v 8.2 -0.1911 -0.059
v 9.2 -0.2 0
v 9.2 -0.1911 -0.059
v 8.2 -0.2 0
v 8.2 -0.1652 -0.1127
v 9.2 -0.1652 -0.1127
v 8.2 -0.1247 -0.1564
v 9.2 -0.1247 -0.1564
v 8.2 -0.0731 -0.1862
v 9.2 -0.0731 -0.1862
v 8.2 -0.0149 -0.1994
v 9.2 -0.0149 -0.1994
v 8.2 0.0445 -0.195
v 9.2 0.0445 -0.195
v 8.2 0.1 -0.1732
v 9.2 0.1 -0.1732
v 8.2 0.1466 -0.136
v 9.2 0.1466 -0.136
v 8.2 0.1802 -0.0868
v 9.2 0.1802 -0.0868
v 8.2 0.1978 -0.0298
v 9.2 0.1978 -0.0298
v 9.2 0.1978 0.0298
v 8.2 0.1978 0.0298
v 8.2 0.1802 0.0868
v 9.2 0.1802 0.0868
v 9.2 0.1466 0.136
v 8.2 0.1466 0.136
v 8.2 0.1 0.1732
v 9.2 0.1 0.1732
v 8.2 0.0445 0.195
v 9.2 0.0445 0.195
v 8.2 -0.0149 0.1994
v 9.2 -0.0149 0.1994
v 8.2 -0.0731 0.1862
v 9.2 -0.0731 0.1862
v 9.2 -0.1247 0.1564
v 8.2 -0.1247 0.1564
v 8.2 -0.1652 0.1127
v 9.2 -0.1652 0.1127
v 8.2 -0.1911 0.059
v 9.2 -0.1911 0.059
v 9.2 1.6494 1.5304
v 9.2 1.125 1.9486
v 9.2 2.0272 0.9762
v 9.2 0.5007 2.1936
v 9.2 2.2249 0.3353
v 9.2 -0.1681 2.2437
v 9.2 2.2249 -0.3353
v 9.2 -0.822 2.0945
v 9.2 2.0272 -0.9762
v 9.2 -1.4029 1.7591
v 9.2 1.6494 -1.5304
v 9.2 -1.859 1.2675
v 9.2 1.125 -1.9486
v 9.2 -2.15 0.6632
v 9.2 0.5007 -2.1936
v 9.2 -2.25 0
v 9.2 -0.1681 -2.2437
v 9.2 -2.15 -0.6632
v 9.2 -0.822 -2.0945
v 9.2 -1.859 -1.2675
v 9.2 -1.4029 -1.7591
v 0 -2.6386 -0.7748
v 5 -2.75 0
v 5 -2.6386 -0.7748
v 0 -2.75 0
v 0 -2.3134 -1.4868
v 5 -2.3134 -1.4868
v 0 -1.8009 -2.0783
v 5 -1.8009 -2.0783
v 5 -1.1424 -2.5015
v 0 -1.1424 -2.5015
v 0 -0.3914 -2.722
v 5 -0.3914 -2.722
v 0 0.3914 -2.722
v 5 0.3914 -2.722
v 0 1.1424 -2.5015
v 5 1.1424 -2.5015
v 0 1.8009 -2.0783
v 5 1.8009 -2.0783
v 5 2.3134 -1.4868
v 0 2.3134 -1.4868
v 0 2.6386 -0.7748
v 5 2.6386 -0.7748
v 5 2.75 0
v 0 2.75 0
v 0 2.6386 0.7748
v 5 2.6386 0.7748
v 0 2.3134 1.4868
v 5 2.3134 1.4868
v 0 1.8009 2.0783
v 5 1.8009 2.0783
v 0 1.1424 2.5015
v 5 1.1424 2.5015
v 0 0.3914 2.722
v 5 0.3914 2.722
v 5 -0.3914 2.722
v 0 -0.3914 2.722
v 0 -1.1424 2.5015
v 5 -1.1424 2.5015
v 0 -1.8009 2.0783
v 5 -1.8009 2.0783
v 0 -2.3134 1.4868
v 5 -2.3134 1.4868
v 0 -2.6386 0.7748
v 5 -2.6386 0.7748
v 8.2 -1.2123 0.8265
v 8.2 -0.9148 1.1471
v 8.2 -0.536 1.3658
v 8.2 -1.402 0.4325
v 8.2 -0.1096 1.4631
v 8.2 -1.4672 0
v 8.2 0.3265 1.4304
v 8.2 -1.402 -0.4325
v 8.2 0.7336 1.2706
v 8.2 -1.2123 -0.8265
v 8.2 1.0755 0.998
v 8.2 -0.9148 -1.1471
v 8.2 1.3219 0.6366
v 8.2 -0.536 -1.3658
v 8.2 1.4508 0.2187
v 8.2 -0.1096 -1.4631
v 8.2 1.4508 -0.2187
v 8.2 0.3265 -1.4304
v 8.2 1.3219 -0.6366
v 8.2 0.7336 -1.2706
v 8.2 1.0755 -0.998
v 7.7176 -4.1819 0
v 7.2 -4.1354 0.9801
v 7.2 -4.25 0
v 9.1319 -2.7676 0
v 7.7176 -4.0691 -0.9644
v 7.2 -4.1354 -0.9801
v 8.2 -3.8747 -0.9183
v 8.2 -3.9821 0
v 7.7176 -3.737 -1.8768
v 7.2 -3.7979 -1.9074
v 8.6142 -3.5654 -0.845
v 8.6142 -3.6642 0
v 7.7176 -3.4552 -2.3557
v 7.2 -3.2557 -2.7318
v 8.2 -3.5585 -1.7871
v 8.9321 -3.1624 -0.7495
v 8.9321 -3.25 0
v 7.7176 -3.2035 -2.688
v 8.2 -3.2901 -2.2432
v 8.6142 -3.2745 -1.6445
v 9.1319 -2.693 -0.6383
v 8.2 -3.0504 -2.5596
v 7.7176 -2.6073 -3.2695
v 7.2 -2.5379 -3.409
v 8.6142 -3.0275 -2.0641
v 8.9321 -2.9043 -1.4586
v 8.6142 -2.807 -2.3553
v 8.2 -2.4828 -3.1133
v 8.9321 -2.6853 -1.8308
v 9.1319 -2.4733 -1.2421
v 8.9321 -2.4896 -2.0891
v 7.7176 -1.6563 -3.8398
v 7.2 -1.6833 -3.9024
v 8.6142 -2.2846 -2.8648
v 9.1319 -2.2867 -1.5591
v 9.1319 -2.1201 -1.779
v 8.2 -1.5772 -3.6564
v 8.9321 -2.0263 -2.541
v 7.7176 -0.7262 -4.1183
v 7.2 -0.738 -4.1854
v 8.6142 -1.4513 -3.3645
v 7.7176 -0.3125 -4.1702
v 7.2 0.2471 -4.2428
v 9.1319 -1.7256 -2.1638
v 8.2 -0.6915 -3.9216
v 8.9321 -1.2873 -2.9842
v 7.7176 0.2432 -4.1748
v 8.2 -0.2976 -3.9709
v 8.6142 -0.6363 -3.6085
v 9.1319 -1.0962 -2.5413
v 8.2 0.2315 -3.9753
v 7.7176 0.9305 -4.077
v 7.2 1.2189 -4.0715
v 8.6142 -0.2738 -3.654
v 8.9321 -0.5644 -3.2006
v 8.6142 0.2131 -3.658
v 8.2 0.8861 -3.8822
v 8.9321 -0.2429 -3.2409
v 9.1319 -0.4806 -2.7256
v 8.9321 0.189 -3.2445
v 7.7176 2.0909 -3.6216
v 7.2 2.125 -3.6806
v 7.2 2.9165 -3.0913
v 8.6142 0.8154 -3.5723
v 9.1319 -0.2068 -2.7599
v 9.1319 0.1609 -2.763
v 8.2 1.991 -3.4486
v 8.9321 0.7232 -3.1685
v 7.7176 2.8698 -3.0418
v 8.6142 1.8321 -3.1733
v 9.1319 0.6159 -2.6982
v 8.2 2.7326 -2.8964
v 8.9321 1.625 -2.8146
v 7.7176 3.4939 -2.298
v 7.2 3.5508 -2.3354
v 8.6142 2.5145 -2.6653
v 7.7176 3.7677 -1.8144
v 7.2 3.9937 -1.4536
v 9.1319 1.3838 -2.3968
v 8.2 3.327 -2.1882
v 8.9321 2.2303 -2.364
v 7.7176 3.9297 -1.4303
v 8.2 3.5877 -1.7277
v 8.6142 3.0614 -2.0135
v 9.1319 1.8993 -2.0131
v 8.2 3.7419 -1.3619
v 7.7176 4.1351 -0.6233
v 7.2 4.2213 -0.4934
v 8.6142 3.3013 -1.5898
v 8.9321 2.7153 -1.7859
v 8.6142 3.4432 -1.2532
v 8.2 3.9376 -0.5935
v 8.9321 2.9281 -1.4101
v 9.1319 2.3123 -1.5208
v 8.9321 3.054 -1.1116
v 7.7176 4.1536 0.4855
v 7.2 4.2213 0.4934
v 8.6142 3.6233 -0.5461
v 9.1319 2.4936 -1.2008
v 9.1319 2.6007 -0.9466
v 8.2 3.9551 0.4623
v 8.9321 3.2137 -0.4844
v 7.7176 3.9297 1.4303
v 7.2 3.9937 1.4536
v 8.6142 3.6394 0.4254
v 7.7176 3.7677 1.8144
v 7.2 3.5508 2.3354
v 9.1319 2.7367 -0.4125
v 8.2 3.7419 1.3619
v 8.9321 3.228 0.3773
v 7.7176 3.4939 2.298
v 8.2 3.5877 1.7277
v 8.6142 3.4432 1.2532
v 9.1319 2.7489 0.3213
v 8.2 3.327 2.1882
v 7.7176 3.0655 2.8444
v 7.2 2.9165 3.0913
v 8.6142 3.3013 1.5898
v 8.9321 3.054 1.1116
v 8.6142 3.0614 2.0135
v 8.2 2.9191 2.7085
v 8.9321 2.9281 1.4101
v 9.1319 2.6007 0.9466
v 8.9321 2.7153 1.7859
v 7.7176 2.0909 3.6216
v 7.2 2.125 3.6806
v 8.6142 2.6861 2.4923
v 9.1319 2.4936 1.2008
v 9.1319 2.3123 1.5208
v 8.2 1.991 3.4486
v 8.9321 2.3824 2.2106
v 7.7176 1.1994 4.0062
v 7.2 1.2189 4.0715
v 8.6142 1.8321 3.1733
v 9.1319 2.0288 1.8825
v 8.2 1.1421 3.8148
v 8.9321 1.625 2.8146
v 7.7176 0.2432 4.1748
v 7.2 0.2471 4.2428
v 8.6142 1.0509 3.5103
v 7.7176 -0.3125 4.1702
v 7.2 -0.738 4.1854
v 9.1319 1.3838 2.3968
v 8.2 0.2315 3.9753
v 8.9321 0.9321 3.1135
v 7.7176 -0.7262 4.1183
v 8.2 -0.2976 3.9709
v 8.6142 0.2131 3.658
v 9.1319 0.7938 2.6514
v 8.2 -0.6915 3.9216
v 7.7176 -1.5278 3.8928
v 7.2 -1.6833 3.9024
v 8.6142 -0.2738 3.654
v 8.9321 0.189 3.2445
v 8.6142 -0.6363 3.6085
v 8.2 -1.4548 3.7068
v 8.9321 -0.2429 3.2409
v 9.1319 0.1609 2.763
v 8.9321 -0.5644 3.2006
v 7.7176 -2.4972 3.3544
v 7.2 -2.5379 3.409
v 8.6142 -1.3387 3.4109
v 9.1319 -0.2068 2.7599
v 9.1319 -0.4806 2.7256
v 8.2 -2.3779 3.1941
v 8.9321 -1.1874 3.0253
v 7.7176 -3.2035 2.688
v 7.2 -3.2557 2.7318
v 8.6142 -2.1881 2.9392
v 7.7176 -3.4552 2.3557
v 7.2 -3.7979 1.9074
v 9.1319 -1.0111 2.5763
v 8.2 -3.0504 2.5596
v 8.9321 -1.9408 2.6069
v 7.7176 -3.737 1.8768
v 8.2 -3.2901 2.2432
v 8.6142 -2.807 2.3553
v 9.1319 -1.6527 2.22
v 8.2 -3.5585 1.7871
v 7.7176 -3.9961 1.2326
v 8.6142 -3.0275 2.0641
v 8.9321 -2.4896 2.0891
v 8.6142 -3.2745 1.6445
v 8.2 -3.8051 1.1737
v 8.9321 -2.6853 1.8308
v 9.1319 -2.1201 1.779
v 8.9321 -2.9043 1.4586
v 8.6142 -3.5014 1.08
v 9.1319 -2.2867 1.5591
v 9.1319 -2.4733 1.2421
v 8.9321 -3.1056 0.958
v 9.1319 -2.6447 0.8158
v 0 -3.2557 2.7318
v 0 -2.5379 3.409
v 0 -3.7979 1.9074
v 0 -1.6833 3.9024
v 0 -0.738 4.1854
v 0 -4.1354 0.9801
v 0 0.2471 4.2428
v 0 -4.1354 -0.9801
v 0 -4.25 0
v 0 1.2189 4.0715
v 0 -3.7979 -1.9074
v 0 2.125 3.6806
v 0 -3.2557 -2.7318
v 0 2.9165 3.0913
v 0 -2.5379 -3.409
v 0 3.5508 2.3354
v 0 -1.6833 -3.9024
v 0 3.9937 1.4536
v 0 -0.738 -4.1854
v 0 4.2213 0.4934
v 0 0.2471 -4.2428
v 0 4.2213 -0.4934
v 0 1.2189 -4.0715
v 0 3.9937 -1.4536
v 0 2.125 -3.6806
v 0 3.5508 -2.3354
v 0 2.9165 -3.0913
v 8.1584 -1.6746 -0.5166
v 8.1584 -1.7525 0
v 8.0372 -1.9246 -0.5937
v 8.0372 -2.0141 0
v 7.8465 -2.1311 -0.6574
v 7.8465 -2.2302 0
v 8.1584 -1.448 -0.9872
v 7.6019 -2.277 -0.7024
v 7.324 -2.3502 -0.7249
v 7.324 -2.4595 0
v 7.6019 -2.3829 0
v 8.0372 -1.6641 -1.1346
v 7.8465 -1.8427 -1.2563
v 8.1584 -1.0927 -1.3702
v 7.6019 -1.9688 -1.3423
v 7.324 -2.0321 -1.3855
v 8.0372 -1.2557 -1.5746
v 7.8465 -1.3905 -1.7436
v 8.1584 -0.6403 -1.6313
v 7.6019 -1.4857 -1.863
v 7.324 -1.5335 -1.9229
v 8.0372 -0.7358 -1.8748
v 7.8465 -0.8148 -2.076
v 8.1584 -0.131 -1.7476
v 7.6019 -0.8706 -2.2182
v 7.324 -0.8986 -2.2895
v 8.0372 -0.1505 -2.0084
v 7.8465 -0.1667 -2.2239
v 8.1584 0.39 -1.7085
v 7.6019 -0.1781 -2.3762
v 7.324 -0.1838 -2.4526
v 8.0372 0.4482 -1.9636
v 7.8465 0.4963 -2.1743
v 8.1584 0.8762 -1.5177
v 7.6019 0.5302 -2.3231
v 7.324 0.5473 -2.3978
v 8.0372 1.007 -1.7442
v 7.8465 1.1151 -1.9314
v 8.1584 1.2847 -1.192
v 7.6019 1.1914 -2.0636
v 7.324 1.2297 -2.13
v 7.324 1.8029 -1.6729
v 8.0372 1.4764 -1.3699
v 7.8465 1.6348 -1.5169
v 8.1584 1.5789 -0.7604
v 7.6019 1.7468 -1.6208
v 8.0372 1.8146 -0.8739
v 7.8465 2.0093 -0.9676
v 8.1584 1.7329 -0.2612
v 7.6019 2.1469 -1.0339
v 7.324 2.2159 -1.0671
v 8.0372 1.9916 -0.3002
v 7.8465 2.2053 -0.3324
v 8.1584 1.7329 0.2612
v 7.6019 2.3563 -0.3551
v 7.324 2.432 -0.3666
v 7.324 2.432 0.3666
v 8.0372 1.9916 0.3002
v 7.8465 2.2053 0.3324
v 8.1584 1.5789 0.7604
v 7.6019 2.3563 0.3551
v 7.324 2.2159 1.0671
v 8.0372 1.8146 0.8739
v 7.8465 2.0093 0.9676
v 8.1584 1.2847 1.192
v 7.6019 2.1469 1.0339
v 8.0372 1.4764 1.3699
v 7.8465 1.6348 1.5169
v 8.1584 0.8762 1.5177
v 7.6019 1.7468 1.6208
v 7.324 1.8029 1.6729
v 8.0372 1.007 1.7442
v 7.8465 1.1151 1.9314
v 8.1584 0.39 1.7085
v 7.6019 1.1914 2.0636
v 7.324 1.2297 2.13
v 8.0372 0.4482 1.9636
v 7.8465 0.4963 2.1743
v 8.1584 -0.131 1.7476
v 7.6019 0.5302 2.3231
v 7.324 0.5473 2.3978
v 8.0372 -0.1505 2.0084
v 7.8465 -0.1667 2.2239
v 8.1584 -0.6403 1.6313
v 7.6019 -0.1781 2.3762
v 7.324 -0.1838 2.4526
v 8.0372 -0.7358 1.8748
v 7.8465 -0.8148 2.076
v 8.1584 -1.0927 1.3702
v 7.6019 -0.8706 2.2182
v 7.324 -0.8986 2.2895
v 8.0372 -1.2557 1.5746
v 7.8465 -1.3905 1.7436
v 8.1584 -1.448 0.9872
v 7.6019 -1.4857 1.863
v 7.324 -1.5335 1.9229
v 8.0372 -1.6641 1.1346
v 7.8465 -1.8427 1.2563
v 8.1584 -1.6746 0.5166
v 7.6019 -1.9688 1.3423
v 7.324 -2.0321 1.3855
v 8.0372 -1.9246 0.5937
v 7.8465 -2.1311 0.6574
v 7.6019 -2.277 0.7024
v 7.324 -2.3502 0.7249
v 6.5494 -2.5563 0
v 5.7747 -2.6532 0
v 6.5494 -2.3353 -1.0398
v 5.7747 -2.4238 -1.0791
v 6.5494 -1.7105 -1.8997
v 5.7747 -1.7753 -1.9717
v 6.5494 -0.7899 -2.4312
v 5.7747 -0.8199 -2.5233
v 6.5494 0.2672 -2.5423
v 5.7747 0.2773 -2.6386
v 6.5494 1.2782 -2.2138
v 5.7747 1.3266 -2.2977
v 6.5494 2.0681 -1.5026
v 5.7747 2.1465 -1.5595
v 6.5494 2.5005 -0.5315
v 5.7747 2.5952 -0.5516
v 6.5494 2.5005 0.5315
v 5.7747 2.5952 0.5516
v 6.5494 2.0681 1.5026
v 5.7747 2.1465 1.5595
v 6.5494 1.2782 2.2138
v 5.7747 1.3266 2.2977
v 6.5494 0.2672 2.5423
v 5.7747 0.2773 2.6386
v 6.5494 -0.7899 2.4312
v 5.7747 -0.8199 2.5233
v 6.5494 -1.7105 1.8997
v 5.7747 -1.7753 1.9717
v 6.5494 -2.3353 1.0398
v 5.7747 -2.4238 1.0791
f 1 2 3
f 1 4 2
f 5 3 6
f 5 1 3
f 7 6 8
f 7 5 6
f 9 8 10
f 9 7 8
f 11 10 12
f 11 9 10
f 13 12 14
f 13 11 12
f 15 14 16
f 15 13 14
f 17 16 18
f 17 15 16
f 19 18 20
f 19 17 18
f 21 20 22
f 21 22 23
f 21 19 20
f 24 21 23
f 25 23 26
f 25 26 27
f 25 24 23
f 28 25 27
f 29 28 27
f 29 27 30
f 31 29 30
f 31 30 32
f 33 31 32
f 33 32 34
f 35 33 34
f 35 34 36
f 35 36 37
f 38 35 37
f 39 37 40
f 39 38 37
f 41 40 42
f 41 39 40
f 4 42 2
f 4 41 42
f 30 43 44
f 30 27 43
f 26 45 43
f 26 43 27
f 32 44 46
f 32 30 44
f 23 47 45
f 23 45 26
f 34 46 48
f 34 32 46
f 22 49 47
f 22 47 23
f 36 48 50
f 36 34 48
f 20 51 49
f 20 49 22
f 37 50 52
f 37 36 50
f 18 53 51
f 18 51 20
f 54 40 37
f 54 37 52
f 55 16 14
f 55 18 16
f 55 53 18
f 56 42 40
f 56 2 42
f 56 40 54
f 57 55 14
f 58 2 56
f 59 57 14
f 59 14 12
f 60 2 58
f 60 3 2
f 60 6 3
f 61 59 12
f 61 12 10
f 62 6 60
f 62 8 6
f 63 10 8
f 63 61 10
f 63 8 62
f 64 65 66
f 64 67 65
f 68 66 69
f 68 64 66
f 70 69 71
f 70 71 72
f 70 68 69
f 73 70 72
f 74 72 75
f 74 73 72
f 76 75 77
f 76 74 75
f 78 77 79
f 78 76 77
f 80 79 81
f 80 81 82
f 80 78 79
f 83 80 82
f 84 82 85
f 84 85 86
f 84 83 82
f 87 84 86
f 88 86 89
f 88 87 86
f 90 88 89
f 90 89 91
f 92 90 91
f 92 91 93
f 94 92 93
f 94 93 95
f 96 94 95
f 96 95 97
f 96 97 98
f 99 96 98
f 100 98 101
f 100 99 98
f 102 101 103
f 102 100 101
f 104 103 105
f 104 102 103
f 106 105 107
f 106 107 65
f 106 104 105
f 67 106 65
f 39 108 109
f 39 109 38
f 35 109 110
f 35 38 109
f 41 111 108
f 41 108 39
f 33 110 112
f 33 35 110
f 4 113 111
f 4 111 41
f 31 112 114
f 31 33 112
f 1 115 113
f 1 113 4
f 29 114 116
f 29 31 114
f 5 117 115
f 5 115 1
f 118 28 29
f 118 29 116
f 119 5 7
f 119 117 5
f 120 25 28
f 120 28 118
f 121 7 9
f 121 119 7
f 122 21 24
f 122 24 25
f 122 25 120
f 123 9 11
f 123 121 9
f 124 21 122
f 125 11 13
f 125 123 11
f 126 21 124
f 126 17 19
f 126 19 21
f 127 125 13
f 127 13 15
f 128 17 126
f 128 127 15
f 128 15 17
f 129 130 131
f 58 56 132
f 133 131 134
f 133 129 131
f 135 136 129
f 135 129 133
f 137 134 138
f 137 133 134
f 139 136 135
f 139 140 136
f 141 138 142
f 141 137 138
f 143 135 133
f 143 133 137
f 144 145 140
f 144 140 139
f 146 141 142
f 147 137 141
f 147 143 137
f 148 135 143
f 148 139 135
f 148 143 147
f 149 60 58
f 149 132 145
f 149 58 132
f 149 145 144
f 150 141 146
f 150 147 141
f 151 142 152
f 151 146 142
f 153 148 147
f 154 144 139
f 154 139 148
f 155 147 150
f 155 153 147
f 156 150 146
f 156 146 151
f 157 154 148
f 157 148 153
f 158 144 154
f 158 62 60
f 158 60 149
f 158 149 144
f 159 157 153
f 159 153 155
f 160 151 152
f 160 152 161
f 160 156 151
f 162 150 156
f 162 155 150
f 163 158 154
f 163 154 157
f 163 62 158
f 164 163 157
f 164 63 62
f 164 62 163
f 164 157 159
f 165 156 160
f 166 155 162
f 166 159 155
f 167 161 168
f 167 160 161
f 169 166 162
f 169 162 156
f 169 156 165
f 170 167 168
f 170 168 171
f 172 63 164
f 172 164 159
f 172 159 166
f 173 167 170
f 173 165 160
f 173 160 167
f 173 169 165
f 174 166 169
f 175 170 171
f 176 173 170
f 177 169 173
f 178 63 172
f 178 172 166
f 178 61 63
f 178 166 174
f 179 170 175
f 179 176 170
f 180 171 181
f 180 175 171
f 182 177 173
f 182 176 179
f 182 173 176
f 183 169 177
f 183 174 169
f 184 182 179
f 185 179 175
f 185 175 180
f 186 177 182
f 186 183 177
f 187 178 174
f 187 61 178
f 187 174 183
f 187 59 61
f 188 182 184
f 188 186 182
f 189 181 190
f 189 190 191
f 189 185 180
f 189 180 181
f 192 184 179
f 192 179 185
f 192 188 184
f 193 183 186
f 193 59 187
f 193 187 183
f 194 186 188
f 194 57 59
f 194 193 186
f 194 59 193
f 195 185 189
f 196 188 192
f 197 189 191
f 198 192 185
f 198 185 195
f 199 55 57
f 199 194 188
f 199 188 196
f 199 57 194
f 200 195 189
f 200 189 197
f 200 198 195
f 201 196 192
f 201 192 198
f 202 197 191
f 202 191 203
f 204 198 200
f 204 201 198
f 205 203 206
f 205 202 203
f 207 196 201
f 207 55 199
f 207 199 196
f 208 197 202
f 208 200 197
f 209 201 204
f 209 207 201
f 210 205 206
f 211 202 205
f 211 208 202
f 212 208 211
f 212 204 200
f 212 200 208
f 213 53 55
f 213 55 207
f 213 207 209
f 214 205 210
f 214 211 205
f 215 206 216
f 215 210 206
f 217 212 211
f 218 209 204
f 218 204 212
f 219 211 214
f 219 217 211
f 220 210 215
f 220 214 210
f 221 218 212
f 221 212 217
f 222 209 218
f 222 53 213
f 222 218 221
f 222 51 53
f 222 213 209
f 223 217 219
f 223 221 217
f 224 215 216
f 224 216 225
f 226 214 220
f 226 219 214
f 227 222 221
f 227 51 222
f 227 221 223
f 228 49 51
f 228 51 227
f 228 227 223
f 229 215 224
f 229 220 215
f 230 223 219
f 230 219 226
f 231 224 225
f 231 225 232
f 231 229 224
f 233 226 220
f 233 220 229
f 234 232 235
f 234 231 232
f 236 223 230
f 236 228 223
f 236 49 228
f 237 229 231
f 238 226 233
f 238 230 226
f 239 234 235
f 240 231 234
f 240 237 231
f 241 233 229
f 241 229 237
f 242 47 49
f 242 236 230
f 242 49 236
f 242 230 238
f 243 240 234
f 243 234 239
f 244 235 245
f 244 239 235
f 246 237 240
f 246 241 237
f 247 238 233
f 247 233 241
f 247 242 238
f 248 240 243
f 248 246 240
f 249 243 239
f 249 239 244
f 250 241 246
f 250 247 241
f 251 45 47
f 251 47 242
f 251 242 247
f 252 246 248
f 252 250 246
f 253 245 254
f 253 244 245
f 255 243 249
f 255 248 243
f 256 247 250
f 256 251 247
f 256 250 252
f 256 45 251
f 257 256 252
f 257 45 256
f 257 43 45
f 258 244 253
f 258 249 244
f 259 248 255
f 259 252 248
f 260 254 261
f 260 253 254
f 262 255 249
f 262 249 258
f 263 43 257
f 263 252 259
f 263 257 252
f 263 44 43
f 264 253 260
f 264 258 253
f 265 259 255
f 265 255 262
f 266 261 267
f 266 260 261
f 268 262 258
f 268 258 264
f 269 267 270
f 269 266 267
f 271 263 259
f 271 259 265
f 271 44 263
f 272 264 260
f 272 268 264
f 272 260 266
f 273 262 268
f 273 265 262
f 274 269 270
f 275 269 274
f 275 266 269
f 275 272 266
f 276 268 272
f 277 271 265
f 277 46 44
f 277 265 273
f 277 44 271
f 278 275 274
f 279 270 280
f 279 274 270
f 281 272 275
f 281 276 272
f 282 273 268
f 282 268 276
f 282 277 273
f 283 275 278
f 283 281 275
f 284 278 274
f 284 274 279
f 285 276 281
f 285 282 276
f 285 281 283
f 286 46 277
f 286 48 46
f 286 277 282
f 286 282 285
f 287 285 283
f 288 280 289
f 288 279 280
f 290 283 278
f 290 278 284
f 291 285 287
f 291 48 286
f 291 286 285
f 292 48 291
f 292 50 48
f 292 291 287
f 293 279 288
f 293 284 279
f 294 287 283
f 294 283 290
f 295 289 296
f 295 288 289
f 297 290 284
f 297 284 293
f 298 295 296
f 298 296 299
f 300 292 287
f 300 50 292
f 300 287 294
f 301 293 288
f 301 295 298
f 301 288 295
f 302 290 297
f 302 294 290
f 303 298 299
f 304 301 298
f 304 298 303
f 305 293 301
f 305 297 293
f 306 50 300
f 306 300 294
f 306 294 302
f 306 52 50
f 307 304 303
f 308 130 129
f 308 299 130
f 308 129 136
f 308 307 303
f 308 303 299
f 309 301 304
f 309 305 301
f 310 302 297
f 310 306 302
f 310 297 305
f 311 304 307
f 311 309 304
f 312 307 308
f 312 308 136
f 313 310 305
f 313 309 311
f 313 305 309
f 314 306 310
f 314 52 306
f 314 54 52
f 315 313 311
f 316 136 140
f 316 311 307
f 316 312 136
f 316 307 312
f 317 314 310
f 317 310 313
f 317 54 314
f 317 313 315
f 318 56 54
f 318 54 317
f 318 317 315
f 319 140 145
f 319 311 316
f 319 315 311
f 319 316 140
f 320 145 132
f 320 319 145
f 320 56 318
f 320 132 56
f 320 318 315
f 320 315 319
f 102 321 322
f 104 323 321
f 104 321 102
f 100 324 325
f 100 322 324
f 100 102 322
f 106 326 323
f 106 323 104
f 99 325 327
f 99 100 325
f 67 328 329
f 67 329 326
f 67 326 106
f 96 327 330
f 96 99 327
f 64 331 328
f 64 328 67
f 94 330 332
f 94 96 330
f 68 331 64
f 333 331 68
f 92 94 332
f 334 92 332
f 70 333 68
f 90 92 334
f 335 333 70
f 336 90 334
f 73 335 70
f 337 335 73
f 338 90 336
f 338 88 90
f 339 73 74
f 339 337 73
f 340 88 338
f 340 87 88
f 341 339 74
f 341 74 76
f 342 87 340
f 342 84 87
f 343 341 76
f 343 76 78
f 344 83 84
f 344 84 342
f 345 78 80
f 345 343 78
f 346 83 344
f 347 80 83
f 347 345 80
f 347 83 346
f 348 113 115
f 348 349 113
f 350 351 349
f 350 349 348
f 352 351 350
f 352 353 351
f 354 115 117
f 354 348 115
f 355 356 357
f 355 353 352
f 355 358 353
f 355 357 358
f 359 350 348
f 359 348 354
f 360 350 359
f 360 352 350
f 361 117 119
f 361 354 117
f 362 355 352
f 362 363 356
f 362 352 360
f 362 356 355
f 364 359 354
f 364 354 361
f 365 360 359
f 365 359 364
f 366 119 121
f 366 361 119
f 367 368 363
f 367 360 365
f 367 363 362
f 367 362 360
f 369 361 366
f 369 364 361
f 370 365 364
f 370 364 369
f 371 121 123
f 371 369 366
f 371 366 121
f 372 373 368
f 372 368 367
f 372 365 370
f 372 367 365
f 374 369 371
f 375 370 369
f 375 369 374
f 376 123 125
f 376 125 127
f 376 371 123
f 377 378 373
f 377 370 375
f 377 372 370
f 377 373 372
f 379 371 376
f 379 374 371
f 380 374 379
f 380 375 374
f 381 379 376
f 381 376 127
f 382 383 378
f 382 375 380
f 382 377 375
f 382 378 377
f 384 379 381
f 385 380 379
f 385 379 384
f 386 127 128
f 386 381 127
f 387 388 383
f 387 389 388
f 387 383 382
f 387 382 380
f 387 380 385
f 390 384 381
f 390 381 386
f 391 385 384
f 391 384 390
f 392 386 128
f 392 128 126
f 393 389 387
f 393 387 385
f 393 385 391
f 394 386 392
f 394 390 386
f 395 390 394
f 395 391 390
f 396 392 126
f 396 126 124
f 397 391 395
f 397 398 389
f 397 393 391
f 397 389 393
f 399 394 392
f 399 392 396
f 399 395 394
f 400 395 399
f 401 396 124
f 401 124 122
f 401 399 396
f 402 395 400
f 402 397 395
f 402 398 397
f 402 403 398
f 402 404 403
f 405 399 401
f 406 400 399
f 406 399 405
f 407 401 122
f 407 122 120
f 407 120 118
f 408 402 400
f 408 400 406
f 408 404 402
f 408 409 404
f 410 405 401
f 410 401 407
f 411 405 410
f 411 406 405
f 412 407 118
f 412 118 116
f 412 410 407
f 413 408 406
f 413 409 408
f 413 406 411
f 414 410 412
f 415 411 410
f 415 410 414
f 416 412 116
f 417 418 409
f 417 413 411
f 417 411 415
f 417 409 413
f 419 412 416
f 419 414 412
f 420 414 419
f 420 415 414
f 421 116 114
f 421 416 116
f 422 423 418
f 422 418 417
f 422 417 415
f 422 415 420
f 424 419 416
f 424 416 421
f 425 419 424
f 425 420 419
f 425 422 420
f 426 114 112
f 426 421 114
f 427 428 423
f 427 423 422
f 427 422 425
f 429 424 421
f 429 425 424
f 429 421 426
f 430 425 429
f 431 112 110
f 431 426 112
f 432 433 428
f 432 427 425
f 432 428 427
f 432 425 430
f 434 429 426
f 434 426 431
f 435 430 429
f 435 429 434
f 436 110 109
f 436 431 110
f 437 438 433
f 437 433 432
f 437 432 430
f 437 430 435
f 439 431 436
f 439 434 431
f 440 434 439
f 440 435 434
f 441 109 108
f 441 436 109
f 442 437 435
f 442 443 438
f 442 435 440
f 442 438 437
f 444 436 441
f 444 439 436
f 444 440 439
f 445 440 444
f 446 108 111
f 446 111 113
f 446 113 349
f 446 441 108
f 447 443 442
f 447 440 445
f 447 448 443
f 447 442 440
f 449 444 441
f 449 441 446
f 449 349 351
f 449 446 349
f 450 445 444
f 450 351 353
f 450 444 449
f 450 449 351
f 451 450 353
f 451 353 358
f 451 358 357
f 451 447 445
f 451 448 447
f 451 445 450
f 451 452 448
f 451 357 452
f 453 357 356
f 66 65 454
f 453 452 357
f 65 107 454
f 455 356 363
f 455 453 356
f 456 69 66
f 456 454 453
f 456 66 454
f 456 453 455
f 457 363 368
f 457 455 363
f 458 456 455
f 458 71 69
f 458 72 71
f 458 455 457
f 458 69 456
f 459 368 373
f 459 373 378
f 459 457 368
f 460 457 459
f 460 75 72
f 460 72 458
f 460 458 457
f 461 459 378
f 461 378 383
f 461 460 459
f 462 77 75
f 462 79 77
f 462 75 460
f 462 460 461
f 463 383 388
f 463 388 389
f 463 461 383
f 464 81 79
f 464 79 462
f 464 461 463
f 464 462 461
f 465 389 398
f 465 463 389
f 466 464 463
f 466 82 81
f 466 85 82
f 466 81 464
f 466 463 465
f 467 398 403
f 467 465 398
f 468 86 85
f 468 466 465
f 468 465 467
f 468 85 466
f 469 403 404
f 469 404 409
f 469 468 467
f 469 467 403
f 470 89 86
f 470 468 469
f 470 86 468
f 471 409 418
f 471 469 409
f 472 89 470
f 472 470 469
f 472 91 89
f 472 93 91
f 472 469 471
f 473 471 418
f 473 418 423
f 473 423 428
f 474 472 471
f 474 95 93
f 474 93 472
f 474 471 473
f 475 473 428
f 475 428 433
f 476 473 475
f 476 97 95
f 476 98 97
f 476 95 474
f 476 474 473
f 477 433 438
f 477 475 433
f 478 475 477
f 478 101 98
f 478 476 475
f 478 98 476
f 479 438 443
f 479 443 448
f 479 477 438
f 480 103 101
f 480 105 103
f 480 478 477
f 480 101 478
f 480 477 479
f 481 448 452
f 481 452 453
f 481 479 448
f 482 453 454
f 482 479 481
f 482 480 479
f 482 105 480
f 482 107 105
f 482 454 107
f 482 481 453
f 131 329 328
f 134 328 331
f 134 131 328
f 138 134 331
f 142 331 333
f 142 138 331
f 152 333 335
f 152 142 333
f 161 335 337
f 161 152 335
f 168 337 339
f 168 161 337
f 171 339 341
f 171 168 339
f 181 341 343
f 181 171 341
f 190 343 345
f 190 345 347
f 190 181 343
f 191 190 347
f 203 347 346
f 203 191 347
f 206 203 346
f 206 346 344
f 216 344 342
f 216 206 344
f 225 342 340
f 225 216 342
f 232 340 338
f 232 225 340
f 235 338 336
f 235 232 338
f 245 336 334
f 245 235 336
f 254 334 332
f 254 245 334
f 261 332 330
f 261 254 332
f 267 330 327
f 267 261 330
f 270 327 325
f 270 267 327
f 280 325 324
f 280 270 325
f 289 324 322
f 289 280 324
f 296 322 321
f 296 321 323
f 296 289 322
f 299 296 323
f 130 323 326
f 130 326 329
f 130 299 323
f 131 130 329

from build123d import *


with BuildPart() as f3:
    # F1 (on face) → F3 (revolve)
    with BuildSketch(Plane.XY):
        with BuildLine():
            Line((5, -2.75), (0, -2.75))
            Line((0, -2.75), (0, -4.25))
            Line((0, -4.25), (7.2, -4.25))
            ThreePointArc((7.2, -4.25), (8.614214, -3.664214), (9.2, -2.25))
            Line((9.2, -2.25), (9.2, -0.2))
            Line((9.2, -0.2), (8.2, -0.2))
            Line((8.2, -0.2), (8.2, -1.467218))
            ThreePointArc((8.2, -1.467218), (7.949678, -2.12902), (7.324035, -2.459496))
            Line((7.324035, -2.459496), (5, -2.75))
        make_face()
    revolve(axis=Axis((5.405035, 0, 0), (1, 0, 0)))


solid = f3.part
